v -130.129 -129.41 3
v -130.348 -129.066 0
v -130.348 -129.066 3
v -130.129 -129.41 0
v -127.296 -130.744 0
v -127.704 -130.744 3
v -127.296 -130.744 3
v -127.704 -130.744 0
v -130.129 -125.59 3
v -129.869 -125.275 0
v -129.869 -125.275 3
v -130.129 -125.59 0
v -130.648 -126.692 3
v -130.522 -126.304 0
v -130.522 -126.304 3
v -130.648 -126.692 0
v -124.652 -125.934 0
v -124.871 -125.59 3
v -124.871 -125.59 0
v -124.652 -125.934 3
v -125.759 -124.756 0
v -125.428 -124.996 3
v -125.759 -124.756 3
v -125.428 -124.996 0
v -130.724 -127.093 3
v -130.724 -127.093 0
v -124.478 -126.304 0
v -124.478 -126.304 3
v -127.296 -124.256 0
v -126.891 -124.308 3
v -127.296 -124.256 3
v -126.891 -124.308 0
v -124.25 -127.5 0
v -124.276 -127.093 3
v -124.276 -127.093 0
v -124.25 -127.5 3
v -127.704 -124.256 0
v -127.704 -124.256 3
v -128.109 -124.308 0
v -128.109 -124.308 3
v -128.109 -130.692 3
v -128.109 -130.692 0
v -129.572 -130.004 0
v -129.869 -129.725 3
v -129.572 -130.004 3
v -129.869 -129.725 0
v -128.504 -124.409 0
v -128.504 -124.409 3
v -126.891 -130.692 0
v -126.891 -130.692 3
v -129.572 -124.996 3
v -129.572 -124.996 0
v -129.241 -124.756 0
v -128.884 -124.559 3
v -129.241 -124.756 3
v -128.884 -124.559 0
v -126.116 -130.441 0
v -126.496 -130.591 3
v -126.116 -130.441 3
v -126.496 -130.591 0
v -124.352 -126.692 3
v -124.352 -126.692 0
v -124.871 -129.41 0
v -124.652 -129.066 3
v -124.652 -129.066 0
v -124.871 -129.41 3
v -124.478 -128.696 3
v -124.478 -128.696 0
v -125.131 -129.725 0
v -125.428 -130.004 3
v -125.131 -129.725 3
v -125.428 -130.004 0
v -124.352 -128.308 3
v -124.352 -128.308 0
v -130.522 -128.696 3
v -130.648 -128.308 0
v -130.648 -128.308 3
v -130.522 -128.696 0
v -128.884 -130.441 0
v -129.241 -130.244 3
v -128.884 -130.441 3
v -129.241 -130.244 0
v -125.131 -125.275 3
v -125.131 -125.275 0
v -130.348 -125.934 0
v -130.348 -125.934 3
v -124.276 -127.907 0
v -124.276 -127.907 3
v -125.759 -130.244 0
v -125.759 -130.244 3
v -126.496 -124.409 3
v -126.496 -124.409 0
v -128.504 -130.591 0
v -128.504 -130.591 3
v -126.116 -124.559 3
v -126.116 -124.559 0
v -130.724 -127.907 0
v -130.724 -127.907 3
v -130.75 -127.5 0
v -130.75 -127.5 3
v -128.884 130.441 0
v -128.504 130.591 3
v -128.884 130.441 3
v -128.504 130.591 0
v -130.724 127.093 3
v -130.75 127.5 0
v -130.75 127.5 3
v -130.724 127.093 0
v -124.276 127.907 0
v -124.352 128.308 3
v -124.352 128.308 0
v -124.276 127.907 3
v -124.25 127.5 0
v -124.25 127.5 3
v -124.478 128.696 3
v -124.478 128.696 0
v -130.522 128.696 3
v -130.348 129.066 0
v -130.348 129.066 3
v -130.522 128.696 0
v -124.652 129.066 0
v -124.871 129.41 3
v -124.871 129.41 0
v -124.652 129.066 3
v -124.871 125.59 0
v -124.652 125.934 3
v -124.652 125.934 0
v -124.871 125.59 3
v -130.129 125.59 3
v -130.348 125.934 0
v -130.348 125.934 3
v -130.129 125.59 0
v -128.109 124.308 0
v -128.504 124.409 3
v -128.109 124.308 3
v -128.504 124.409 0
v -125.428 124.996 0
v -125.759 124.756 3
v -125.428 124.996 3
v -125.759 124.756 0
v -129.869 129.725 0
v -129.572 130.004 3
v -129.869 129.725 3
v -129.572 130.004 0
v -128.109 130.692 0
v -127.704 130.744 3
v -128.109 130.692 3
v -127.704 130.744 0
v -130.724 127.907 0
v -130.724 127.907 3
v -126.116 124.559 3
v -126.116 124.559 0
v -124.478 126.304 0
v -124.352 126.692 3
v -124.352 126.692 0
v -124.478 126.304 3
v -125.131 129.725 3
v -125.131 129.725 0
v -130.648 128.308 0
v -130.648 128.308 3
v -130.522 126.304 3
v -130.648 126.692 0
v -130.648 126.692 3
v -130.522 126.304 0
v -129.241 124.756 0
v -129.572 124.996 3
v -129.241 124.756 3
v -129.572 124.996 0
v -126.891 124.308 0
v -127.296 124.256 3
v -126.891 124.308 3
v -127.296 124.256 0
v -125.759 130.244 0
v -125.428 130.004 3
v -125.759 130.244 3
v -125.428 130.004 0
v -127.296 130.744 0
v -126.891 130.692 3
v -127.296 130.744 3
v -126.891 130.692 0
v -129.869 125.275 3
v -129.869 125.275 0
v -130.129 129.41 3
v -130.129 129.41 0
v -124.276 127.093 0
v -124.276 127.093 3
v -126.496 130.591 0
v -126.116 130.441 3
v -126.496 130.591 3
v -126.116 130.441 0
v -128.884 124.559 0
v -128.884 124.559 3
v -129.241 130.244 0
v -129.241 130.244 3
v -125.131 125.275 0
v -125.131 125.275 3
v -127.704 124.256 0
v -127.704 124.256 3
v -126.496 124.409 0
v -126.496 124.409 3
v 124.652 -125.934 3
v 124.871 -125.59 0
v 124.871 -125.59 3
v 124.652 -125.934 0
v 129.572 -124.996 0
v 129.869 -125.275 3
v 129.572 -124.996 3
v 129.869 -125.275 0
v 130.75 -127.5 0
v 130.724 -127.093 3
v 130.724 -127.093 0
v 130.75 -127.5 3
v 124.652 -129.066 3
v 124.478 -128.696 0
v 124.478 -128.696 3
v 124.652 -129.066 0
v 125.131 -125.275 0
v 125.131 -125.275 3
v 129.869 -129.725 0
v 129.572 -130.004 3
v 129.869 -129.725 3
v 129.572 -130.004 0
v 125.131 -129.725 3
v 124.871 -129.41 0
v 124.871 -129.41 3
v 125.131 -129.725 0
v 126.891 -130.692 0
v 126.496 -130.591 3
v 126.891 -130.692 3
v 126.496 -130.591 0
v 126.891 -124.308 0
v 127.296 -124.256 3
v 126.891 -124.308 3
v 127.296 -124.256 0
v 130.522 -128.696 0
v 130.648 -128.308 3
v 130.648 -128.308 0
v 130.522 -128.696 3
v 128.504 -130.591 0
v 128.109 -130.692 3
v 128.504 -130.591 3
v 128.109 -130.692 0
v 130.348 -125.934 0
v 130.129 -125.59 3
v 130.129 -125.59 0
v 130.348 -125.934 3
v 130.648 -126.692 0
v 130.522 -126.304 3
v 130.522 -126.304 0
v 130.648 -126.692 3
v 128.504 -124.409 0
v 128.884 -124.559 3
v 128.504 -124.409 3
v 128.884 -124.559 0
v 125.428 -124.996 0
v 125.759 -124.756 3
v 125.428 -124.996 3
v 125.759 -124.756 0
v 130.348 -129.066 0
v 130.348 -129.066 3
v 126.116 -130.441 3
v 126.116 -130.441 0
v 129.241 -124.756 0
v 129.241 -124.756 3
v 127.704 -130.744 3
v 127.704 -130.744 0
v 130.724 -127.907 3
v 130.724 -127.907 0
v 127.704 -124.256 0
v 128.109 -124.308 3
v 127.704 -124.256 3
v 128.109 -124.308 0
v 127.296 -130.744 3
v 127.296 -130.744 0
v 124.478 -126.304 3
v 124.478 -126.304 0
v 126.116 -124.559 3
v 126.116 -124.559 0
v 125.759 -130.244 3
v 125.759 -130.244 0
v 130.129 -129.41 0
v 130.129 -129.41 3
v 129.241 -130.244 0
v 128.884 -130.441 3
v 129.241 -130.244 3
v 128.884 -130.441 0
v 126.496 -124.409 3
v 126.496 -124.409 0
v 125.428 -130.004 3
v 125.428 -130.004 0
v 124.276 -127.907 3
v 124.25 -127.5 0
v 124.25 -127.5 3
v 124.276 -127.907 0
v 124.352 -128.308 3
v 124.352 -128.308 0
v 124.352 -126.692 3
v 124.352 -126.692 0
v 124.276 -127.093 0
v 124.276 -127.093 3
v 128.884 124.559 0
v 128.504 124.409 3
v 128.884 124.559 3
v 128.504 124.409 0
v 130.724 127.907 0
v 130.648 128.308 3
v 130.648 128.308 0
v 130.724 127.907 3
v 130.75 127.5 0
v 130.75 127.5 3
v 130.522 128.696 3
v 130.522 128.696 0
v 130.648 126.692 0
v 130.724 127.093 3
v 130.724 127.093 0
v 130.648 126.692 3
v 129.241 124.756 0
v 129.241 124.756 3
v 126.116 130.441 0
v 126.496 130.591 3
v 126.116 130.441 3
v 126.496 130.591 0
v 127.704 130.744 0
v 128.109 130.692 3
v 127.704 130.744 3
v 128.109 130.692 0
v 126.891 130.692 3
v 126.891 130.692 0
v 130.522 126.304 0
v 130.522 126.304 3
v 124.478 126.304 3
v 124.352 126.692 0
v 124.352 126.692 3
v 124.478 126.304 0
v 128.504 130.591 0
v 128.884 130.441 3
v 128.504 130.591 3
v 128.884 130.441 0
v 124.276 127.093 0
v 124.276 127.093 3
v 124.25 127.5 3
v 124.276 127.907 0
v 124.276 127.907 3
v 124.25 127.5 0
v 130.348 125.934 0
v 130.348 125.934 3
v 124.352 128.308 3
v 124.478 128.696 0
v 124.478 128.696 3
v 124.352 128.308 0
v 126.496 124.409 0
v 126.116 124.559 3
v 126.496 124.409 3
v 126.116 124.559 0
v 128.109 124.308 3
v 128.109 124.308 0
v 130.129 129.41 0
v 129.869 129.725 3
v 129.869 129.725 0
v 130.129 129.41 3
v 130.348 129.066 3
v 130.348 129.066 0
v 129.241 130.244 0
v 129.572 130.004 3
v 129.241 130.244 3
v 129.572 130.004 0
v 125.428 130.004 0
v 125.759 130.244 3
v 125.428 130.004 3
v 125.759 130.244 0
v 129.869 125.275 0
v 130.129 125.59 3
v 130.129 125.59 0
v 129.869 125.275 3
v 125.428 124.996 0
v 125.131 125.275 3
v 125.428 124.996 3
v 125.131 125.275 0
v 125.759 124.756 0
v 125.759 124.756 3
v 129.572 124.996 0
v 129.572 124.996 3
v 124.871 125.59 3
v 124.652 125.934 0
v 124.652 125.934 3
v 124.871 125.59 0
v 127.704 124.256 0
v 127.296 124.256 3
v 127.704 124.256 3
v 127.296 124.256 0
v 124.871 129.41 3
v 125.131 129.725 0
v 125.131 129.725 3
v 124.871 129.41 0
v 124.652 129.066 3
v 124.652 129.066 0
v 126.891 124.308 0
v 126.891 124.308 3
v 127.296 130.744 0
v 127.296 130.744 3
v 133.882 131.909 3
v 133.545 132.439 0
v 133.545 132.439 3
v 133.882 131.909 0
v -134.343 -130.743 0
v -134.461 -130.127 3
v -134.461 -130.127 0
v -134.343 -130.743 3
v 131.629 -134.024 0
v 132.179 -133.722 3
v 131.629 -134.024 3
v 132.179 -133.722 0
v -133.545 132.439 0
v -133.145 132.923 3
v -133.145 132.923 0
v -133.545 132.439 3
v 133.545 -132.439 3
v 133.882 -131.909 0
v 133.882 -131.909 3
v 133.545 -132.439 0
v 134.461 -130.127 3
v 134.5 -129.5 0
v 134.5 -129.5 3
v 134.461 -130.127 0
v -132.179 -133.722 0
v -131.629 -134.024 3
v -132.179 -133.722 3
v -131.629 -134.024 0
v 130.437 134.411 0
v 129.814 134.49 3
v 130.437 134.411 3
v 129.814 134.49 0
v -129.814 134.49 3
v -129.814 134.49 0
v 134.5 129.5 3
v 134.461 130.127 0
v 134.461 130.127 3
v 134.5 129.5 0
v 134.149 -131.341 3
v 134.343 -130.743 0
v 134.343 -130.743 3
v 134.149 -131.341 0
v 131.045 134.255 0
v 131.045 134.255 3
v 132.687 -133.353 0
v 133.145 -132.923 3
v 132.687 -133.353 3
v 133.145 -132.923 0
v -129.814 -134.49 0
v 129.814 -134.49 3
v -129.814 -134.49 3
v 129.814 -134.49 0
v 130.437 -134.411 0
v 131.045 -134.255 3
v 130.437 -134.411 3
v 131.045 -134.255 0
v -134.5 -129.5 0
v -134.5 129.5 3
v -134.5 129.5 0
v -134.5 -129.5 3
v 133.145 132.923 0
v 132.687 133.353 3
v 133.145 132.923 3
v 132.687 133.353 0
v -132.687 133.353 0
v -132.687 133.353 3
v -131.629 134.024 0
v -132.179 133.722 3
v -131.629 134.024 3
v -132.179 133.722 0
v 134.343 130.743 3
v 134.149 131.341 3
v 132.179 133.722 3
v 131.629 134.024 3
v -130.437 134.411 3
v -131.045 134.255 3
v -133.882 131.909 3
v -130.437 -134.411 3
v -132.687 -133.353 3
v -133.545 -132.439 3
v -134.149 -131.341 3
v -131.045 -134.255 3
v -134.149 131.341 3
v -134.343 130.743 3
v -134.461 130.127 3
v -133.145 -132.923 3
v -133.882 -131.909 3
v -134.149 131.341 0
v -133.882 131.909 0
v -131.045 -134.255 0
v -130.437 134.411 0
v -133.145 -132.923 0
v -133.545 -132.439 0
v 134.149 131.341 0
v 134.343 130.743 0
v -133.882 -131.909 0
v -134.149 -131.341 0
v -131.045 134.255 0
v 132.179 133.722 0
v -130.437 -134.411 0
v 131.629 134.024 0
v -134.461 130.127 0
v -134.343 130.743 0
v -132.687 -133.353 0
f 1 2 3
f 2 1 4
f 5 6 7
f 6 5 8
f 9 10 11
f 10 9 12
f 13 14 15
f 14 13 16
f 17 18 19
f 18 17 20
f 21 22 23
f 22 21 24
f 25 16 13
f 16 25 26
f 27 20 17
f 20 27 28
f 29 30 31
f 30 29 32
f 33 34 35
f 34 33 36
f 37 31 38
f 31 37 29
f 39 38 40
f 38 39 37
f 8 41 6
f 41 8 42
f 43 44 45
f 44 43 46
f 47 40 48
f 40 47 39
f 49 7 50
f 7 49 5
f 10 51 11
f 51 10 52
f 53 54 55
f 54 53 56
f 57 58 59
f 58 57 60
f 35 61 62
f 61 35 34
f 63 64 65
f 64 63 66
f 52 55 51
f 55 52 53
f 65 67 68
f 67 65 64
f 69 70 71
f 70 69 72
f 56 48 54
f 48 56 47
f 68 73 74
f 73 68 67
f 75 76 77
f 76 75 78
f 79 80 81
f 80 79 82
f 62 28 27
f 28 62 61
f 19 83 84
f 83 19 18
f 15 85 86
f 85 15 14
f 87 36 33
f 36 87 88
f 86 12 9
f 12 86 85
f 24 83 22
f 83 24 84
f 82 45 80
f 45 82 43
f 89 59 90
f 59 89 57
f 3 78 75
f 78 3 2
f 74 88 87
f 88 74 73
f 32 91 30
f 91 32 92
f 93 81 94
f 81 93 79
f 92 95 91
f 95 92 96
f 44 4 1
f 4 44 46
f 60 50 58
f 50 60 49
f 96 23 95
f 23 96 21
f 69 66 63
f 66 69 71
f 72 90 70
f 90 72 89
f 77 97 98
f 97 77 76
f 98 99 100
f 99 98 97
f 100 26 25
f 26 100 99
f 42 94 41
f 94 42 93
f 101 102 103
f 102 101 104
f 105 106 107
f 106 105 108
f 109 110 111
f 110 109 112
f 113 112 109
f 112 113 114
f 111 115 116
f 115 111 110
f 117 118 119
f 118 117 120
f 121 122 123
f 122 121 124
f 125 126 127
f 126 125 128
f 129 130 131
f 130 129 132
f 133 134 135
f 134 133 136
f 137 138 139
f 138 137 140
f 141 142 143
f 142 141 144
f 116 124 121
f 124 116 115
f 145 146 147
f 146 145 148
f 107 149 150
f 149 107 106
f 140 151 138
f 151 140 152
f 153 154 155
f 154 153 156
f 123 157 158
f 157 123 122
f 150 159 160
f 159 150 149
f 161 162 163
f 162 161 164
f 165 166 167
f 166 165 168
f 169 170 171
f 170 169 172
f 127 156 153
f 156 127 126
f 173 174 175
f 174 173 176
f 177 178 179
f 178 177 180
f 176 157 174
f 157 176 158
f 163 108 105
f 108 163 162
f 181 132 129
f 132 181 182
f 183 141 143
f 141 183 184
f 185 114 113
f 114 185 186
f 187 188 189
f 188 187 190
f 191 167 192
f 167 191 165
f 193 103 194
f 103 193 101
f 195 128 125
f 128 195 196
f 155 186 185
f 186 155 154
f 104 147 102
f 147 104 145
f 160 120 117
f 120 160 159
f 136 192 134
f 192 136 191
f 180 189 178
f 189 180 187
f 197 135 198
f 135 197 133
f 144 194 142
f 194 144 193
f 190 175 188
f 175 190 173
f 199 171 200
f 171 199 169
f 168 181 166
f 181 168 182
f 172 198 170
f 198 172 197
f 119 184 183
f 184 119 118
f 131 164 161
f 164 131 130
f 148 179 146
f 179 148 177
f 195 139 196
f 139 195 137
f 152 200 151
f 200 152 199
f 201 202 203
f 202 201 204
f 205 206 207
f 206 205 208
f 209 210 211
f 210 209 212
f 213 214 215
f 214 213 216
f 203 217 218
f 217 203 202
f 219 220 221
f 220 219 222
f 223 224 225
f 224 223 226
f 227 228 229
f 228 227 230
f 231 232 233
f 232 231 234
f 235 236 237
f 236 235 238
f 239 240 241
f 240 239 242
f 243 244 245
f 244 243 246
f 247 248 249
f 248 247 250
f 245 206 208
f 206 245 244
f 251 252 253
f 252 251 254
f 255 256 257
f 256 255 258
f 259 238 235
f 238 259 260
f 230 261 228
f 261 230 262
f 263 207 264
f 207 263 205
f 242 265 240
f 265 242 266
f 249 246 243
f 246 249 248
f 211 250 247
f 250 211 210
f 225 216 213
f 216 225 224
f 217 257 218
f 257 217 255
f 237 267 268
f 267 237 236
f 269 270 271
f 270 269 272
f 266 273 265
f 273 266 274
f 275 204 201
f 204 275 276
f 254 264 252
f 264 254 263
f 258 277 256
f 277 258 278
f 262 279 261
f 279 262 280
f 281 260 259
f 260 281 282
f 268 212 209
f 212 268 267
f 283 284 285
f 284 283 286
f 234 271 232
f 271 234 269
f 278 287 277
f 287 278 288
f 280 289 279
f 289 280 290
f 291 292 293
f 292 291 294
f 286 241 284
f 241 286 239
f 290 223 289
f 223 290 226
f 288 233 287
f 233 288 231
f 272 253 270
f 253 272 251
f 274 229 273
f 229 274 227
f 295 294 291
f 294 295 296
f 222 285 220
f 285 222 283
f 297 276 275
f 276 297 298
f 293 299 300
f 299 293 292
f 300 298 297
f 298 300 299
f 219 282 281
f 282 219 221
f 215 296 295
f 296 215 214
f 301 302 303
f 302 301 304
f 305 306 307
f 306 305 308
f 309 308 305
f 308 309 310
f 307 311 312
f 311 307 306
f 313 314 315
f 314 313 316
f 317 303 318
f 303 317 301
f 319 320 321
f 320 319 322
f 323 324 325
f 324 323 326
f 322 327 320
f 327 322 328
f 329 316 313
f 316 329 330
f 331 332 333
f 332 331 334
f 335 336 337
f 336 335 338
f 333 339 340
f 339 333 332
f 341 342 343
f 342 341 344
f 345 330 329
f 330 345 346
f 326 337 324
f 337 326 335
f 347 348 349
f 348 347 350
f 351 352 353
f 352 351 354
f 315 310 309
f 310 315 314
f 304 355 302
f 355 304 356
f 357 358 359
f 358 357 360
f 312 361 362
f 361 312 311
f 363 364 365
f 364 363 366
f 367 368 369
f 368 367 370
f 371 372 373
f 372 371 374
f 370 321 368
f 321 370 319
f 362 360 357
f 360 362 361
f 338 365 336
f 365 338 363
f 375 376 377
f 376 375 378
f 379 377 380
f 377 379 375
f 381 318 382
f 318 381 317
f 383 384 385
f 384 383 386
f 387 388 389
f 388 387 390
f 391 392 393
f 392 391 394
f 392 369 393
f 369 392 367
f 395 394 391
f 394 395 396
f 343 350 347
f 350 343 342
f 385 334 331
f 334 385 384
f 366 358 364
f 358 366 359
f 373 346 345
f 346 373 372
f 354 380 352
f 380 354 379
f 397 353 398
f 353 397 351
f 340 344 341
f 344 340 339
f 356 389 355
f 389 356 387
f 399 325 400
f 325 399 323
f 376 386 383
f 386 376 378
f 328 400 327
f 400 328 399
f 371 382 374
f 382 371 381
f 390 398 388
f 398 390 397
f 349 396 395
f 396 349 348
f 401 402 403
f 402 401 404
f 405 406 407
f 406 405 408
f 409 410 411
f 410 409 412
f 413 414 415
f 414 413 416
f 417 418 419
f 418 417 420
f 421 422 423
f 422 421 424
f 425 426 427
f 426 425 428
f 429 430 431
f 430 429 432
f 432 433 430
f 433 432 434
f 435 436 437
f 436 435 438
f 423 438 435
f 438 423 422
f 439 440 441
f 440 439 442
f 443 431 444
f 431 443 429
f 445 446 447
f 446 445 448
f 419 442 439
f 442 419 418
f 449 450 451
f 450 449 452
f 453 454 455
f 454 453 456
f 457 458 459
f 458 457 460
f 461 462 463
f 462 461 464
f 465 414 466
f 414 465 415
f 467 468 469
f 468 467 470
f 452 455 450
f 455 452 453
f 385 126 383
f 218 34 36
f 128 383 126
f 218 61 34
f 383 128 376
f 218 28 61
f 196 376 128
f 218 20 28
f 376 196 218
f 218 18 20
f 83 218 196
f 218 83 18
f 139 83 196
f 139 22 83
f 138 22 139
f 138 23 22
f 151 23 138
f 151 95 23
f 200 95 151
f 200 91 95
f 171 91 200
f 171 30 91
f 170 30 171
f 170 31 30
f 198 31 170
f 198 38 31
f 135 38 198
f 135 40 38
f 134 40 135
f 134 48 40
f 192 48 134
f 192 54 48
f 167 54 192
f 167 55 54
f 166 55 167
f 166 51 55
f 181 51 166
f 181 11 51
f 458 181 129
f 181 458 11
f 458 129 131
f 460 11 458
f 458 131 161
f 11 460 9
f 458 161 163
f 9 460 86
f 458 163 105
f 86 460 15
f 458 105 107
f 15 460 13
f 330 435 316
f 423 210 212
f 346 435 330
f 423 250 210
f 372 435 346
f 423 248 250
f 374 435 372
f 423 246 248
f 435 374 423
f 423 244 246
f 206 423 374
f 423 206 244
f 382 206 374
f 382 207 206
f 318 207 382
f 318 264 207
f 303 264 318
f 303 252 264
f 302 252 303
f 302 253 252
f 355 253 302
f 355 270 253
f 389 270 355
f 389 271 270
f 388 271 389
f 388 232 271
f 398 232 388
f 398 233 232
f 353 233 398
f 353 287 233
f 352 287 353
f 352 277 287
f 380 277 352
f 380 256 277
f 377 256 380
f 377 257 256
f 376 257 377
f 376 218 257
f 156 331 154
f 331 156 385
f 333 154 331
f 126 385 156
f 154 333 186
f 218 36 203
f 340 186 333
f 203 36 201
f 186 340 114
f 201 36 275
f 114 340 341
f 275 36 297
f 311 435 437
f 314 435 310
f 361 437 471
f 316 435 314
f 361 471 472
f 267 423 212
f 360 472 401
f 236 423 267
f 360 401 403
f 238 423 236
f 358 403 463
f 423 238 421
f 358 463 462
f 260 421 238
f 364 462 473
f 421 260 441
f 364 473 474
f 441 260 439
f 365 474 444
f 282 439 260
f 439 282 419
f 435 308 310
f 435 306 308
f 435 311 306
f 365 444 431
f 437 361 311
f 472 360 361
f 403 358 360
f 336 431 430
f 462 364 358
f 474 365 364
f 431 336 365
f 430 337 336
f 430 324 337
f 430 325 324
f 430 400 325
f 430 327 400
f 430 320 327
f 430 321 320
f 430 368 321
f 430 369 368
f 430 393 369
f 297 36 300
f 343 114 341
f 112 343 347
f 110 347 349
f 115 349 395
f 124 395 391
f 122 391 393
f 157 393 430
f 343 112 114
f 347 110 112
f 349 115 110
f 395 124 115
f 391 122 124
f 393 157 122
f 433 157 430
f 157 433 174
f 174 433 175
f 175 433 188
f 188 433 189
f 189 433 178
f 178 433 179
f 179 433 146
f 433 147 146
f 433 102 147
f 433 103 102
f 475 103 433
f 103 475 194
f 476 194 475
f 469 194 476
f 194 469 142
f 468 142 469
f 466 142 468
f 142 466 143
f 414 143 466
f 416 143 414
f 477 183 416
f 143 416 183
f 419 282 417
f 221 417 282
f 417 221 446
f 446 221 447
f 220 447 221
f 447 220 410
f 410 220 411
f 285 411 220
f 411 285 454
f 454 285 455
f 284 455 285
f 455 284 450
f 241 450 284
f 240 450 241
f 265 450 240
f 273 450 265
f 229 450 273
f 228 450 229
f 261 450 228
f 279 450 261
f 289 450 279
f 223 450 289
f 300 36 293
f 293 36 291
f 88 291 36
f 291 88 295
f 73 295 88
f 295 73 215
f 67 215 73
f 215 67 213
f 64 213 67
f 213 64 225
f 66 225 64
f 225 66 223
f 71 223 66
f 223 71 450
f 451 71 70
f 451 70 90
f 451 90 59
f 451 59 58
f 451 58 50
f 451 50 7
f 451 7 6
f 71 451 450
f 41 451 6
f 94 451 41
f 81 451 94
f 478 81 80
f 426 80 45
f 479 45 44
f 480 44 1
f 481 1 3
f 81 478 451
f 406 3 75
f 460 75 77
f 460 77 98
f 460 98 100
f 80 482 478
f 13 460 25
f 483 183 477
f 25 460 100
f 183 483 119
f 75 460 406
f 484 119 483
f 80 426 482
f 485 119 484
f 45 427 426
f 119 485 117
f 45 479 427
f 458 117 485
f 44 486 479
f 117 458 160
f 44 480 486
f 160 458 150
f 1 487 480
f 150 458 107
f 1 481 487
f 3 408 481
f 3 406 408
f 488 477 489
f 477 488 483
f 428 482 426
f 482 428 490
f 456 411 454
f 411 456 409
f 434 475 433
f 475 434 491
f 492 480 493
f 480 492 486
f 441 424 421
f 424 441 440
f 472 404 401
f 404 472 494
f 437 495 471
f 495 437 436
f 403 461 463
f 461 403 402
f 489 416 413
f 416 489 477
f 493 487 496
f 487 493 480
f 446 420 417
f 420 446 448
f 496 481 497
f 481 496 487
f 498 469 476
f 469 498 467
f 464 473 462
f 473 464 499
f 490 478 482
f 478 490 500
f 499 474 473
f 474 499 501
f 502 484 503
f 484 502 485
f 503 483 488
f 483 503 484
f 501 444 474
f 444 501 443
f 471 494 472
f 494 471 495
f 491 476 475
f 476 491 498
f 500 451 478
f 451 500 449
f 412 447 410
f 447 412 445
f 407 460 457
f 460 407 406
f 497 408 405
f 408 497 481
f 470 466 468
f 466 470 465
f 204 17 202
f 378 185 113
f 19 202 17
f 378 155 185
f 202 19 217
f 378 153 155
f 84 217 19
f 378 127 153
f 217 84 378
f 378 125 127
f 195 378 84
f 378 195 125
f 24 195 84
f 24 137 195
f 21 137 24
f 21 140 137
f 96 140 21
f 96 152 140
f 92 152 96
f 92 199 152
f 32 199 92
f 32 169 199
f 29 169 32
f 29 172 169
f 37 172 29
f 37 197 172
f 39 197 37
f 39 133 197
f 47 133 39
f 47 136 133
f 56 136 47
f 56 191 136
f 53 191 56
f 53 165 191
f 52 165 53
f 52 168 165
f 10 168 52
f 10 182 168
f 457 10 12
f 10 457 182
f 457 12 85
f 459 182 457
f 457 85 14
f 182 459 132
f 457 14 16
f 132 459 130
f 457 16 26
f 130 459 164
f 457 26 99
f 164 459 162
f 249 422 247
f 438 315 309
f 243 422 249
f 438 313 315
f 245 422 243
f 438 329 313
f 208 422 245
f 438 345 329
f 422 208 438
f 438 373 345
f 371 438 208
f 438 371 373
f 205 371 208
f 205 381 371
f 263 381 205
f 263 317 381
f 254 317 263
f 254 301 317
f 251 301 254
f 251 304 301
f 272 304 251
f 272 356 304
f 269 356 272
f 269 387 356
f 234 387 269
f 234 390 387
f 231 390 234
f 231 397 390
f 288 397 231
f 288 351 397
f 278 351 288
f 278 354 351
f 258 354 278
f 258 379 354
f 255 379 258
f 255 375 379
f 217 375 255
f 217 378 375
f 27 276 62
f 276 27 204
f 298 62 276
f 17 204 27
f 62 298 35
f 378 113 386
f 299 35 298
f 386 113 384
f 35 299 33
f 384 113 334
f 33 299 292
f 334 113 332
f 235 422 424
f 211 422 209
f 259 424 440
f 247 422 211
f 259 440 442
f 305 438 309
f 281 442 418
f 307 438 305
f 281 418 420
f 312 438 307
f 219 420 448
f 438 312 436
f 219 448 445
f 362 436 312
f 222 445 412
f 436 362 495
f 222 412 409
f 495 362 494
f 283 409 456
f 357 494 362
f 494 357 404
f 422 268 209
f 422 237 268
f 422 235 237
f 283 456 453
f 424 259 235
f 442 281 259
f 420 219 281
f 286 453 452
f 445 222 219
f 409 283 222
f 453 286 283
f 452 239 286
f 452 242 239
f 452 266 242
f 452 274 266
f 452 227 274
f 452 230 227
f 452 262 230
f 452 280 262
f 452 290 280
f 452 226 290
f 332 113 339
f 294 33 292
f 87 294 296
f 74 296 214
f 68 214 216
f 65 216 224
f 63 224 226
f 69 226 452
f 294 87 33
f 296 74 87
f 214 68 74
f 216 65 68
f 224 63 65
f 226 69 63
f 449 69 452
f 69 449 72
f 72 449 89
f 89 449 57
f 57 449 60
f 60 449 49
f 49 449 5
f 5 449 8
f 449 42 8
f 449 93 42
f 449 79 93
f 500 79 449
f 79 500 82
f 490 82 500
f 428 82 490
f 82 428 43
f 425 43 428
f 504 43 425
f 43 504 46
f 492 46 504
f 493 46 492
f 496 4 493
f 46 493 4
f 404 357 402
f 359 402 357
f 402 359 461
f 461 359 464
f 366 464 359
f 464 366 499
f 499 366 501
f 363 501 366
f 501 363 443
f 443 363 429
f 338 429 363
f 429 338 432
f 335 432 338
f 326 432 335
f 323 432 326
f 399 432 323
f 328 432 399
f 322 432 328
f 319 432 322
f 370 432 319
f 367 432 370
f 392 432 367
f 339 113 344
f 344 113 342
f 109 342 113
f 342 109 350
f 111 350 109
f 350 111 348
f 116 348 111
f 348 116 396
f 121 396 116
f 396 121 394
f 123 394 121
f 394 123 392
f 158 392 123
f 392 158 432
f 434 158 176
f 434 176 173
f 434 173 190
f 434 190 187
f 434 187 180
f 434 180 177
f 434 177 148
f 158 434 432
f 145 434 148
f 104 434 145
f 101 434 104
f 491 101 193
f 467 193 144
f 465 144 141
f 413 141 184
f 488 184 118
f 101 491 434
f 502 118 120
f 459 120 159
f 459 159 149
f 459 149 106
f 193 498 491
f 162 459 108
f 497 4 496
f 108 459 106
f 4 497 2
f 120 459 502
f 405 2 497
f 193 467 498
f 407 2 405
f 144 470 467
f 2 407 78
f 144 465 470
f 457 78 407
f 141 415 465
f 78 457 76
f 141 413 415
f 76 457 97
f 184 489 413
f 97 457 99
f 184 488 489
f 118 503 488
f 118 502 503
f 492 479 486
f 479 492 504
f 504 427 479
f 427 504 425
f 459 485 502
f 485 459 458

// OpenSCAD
$fn = 50;


difference() {
	union() {
		hull() {
			translate(v = [-129.5000000000, 129.5000000000, 0]) {
				cylinder(h = 3, r = 5);
			}
			translate(v = [129.5000000000, 129.5000000000, 0]) {
				cylinder(h = 3, r = 5);
			}
			translate(v = [-129.5000000000, -129.5000000000, 0]) {
				cylinder(h = 3, r = 5);
			}
			translate(v = [129.5000000000, -129.5000000000, 0]) {
				cylinder(h = 3, r = 5);
			}
		}
	}
	union() {
		translate(v = [-127.5000000000, -127.5000000000, -100.0000000000]) {
			cylinder(h = 200, r = 3.2500000000);
		}
		translate(v = [-127.5000000000, 127.5000000000, -100.0000000000]) {
			cylinder(h = 200, r = 3.2500000000);
		}
		translate(v = [127.5000000000, -127.5000000000, -100.0000000000]) {
			cylinder(h = 200, r = 3.2500000000);
		}
		translate(v = [127.5000000000, 127.5000000000, -100.0000000000]) {
			cylinder(h = 200, r = 3.2500000000);
		}
	}
}
